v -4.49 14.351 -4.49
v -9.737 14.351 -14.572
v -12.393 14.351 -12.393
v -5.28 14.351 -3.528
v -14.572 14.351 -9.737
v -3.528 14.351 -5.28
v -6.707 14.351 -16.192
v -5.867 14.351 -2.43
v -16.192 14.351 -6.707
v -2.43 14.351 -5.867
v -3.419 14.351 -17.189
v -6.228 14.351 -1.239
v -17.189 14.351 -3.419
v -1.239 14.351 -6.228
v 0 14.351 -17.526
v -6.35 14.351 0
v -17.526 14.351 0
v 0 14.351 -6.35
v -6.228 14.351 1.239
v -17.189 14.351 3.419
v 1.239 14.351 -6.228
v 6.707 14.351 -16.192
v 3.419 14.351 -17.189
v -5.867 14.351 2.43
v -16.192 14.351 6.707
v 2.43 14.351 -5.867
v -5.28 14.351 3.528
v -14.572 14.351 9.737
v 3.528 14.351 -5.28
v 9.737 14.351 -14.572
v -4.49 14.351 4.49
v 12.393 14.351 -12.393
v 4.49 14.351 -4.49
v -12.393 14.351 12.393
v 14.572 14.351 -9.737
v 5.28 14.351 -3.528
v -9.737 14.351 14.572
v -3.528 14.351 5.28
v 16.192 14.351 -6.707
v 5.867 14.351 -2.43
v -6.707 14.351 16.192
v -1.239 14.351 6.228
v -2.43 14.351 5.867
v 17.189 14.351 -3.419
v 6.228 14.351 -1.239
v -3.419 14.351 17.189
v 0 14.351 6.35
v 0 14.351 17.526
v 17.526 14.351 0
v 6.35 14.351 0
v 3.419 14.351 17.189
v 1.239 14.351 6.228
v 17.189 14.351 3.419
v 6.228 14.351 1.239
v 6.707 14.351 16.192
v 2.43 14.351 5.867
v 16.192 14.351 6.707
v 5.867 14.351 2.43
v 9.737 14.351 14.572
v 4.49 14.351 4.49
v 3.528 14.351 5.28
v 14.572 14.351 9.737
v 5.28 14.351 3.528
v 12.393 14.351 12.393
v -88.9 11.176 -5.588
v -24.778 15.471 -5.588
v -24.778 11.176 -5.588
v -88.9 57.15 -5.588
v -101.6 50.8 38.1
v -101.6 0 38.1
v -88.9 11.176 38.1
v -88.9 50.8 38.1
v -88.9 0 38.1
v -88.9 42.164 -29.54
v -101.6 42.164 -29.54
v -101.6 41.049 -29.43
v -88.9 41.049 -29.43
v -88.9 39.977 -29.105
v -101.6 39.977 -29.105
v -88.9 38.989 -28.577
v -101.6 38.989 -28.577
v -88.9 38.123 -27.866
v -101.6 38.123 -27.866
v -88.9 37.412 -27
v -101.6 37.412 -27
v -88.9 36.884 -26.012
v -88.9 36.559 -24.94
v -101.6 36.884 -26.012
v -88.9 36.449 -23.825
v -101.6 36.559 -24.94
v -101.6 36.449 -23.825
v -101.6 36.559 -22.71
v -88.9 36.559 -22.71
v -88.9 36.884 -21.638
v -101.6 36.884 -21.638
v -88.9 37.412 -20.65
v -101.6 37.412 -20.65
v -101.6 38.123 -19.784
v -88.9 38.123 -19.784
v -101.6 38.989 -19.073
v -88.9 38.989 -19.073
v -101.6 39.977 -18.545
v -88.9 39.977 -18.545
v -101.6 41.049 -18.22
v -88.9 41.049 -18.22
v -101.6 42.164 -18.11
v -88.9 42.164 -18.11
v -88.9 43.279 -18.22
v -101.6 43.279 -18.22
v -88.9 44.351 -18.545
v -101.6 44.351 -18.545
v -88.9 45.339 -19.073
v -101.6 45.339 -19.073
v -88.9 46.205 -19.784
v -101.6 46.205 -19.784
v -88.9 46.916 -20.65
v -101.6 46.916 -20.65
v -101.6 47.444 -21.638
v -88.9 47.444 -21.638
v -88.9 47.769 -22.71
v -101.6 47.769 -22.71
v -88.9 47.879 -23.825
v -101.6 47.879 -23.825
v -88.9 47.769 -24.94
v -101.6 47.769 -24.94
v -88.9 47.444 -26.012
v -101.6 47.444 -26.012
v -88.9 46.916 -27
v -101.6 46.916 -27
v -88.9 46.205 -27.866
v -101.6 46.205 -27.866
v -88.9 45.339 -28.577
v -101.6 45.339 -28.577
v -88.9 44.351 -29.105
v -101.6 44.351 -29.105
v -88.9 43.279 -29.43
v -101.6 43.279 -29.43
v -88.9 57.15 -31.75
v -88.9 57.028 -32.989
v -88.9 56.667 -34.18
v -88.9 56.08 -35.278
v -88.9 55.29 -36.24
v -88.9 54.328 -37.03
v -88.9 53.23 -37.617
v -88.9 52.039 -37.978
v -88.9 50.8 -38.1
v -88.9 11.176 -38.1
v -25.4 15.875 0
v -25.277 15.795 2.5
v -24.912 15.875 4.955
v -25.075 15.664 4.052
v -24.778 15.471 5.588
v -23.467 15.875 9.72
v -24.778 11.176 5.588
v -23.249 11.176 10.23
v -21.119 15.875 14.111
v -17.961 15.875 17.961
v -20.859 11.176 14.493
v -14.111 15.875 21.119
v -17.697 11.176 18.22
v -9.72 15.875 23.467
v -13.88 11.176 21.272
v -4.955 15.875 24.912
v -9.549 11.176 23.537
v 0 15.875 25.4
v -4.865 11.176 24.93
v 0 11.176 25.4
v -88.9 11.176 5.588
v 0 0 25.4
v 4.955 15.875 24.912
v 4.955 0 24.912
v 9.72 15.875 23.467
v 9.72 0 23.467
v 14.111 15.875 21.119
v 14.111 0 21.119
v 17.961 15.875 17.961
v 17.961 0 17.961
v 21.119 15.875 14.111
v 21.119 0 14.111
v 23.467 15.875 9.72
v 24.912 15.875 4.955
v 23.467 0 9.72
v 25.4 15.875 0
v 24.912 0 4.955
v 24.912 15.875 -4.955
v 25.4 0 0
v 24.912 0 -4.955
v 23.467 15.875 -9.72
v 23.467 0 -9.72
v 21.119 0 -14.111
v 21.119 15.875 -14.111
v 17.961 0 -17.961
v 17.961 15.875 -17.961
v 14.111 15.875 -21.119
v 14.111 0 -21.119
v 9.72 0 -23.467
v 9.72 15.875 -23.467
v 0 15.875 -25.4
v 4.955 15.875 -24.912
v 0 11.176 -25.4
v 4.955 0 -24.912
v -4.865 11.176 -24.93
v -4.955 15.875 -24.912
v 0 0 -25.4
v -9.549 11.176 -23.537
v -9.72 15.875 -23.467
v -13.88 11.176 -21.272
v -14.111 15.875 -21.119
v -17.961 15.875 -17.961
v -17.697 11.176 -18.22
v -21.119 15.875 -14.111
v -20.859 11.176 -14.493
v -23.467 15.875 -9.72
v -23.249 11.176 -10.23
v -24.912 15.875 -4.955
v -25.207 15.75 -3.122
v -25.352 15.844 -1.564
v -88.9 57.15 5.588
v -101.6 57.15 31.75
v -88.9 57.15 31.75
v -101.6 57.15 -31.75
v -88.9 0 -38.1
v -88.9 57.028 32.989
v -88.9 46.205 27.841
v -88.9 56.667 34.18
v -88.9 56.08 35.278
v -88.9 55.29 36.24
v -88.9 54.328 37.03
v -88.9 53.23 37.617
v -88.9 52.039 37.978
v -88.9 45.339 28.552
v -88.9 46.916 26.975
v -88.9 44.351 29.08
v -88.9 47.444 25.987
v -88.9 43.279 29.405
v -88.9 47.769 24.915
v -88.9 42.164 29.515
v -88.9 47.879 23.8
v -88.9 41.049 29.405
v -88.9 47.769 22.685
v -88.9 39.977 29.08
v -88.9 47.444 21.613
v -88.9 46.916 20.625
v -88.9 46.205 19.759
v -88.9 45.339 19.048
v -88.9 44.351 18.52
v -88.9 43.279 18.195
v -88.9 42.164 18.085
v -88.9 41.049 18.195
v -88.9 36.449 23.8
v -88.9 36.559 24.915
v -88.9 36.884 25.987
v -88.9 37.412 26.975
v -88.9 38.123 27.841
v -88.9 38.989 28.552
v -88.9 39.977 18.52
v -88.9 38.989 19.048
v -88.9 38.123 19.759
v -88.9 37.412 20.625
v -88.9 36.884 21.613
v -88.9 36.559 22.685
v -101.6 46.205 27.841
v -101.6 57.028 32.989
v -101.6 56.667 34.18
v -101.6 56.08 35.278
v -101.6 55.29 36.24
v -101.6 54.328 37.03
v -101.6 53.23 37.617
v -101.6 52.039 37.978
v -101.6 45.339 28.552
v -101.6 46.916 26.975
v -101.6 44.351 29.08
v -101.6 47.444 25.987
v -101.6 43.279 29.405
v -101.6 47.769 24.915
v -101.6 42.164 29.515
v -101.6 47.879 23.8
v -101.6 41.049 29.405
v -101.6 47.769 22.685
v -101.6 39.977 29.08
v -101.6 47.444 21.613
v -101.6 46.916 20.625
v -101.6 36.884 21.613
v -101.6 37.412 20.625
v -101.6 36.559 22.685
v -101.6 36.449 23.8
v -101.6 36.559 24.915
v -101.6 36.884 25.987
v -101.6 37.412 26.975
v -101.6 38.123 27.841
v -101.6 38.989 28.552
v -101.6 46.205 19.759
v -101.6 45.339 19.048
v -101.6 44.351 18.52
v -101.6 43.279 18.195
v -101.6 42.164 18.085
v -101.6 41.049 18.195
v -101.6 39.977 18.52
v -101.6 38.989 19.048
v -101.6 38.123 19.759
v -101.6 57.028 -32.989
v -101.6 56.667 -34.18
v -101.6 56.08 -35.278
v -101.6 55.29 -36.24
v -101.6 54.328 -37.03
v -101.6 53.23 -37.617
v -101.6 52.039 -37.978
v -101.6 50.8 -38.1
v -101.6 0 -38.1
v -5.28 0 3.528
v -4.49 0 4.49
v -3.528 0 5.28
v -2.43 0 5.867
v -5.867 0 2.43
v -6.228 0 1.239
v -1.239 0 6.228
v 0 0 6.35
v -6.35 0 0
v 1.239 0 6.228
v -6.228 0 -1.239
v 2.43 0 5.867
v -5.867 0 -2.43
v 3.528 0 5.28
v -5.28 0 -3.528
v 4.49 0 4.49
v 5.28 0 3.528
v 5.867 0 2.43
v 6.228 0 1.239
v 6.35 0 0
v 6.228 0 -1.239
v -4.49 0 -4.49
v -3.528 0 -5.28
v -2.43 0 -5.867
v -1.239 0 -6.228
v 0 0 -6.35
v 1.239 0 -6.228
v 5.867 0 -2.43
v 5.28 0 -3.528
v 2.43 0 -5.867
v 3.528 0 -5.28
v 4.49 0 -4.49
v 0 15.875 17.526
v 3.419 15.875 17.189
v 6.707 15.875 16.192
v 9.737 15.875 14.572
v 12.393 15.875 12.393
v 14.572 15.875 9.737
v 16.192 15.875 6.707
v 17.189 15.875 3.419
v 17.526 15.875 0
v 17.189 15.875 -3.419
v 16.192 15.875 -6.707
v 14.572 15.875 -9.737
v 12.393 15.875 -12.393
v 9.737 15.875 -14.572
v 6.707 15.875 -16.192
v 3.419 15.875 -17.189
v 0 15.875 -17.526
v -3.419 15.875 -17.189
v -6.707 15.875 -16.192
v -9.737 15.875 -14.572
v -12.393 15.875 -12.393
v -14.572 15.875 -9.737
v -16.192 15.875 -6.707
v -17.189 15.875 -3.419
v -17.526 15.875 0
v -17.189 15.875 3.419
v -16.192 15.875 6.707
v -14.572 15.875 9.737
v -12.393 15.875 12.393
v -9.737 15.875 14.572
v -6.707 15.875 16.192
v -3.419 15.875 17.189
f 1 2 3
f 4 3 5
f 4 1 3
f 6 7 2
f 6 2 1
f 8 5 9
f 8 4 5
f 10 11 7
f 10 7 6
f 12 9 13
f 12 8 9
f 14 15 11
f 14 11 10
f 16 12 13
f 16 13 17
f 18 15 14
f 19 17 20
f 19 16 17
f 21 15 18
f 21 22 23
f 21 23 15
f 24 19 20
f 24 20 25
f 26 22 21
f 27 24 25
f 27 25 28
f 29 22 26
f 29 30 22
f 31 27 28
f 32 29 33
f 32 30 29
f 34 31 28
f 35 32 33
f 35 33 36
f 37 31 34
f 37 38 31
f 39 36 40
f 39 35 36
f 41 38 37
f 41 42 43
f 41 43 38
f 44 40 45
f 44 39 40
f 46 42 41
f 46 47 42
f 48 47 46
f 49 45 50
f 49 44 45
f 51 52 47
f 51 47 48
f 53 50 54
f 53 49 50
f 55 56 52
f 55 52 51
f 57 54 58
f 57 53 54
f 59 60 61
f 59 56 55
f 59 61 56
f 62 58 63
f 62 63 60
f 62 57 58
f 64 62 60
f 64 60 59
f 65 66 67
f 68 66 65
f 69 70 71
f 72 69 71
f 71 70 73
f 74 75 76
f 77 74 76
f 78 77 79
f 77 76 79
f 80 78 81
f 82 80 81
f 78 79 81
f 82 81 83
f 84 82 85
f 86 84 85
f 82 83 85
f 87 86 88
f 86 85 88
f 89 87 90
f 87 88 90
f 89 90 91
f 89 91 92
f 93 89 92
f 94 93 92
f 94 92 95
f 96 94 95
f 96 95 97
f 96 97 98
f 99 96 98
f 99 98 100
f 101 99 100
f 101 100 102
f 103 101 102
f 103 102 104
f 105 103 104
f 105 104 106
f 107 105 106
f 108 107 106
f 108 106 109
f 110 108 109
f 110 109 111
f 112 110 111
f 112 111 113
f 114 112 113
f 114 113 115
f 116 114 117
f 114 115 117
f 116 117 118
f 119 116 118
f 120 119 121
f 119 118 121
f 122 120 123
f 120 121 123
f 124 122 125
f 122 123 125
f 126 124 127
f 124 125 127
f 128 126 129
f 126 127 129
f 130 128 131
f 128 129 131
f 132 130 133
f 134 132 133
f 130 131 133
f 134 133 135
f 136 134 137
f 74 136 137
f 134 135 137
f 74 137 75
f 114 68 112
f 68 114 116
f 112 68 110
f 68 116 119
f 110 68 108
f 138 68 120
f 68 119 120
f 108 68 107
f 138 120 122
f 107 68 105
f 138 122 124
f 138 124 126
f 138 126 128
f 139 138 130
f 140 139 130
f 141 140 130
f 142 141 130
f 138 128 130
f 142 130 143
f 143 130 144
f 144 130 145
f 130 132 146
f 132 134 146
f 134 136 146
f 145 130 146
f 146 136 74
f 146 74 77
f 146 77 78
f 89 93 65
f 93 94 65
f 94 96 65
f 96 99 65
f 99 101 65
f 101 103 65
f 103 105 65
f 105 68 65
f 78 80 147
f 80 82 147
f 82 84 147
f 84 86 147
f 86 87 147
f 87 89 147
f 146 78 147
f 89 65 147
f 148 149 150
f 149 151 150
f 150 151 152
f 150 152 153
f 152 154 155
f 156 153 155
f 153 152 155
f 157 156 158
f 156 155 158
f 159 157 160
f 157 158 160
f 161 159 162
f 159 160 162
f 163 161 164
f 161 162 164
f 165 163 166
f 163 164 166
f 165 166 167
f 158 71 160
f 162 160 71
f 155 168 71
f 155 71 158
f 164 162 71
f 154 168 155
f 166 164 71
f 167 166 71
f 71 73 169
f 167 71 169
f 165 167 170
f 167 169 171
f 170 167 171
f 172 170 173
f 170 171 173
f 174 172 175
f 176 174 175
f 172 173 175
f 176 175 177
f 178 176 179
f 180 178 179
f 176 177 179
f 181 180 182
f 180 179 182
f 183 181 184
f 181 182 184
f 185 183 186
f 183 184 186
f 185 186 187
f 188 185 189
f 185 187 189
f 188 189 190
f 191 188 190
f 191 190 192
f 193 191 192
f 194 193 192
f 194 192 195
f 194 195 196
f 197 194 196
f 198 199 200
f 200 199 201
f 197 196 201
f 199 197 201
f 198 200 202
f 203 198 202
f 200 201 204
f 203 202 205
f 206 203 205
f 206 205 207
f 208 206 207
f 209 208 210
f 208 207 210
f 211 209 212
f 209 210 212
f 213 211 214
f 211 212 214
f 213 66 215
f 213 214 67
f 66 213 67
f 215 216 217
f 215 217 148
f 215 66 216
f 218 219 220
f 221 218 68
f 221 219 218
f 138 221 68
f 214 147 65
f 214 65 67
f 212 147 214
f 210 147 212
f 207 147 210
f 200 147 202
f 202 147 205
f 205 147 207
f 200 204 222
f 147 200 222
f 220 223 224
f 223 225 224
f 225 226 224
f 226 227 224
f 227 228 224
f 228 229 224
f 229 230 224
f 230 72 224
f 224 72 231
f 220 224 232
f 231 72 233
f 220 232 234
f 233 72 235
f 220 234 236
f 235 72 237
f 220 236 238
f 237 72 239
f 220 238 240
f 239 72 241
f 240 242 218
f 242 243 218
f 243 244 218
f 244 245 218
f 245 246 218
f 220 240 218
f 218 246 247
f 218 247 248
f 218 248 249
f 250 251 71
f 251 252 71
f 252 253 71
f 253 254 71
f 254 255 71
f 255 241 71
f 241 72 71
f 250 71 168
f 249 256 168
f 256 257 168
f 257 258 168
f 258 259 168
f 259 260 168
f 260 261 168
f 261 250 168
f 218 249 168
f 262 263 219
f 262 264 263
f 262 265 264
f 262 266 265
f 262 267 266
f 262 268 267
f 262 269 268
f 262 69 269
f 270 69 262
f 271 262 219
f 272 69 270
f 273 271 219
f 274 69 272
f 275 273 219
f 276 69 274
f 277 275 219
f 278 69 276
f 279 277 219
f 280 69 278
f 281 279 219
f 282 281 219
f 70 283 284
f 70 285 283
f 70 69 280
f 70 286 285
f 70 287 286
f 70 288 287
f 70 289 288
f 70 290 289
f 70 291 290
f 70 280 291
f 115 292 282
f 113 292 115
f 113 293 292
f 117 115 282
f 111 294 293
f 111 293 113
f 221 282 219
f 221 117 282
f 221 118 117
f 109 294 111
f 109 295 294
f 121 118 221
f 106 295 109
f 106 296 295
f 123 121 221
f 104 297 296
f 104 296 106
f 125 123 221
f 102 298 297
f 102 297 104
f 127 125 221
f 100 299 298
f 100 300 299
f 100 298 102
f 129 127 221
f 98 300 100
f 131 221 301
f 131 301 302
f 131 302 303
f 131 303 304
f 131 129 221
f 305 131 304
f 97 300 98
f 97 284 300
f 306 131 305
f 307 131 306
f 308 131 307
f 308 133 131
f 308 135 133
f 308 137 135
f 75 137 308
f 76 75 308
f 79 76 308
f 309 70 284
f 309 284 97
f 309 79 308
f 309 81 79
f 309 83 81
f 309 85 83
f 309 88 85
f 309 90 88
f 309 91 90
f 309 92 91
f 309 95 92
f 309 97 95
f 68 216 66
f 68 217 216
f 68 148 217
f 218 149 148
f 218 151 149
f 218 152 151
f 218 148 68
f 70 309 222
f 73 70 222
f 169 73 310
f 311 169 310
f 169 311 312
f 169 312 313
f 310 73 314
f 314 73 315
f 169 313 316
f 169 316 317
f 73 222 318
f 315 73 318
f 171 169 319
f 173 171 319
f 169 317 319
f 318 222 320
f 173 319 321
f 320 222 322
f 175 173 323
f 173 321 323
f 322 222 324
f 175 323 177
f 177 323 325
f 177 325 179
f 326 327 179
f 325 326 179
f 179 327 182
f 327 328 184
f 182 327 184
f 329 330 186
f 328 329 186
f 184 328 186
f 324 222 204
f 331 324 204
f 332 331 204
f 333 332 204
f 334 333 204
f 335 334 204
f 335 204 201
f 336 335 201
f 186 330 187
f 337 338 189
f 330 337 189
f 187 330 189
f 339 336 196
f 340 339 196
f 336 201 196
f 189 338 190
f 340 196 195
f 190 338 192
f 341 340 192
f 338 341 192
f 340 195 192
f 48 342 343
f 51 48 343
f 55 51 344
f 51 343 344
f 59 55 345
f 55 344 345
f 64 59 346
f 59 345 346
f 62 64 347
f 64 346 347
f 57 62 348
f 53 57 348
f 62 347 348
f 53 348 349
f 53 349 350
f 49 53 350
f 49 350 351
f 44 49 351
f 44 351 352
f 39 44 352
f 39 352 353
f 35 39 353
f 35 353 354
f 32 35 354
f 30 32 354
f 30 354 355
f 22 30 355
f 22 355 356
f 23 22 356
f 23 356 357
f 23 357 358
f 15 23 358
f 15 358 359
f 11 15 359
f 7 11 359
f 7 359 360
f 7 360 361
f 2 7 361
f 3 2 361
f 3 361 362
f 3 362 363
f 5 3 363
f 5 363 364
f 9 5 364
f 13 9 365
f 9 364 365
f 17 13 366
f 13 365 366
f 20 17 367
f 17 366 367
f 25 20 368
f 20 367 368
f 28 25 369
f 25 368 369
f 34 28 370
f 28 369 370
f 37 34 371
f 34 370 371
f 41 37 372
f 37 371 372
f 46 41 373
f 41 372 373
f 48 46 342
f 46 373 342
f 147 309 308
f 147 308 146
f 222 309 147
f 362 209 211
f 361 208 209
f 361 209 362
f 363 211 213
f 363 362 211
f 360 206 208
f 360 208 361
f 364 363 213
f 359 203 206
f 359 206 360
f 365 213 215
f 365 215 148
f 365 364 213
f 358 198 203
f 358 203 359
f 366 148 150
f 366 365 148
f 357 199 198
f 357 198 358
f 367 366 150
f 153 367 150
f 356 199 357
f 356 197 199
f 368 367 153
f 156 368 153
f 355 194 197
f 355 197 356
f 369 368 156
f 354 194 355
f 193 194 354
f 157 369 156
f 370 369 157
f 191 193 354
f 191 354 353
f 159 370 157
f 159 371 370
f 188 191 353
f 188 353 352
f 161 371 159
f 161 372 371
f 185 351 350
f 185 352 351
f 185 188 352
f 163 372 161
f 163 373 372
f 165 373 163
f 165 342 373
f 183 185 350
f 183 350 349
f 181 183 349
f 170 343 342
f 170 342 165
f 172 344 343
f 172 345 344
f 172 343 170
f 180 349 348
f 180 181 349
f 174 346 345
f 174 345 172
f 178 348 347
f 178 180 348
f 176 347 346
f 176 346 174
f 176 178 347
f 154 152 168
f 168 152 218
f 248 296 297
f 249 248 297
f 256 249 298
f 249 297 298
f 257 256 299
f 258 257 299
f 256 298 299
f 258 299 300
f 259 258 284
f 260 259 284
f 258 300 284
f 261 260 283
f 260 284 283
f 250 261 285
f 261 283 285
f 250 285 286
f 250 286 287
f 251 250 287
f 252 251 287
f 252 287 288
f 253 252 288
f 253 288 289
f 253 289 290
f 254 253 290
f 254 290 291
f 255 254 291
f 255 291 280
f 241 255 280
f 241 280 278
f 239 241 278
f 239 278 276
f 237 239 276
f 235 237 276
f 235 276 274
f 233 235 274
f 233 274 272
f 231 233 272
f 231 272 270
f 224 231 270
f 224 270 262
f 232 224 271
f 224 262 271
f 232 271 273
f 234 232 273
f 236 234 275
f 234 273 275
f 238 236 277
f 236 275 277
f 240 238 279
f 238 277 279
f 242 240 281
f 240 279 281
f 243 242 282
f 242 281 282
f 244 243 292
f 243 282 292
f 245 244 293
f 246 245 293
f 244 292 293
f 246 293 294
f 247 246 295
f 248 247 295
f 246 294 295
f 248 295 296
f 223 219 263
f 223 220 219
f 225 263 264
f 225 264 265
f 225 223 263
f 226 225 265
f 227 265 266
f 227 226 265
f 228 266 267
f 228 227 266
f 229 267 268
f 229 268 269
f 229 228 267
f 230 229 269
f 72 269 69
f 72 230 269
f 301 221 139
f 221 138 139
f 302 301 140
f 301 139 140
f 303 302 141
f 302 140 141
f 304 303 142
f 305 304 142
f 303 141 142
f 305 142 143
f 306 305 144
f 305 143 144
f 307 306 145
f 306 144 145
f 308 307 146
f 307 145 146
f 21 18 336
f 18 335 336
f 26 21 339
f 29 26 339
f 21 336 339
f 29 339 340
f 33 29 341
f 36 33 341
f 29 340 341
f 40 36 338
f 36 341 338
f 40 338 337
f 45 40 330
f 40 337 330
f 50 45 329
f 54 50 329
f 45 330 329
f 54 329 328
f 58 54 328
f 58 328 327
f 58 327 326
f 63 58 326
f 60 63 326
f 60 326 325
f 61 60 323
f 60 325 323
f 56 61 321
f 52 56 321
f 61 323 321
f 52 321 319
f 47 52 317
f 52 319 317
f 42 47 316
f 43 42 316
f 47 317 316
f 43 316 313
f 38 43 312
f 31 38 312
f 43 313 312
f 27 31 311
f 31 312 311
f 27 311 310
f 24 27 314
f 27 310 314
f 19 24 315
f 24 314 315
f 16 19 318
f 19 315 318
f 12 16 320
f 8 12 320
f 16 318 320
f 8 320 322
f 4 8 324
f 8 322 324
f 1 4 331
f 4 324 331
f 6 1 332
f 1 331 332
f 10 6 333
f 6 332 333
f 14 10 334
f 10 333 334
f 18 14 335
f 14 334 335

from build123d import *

# Parameters (mm, degrees)
SKETCH1_R                                            = 25.4
BOSS_EXTRUDE1_DEPTH                                  = 15.875
BOSS_EXTRUDE2_DEPTH                                  = 11.176
SKETCH3_W                                            = 12.7
SKETCH3_H                                            = 76.2
BOSS_EXTRUDE3_DEPTH                                  = 57.15
CBORE_FOR_3_8_BINDING_HEAD_MACHINE_SCREW_D           = 12.7
CBORE_FOR_3_8_BINDING_HEAD_MACHINE_SCREW_CBORE_D     = 35.052
CBORE_FOR_3_8_BINDING_HEAD_MACHINE_SCREW_CBORE_DEPTH = 1.524
BOSS_EXTRUDE7_DEPTH                                  = 5.588
F_25_64_0_45_DIAMETER_HOLE1_D                        = 11.43
FILLET1_R                                            = 6.35


with BuildPart() as part:
    # Sketch1 → Boss-Extrude1 (new body)
    with BuildSketch(Plane(origin=(0, 0, 0), x_dir=(1, 0, 0), z_dir=(0, 1, 0))):
        with Locations(Location((0, 0, 0), (0, 0, 270))):
            Circle(SKETCH1_R)
    extrude(amount=BOSS_EXTRUDE1_DEPTH)

    # Sketch2 → Boss-Extrude2 (add)
    with BuildSketch(Plane(origin=(0, 0, 0), x_dir=(1, 0, 0), z_dir=(0, 1, 0))):
        with BuildLine():
            Line((-88.9, 38.1), (-88.9, -38.1))
            Line((-88.9, -38.1), (0, -25.4))
            ThreePointArc((0, -25.4), (-25.4, 0), (0, 25.4))
            Line((0, 25.4), (-88.9, 38.1))
        make_face()
    extrude(amount=BOSS_EXTRUDE2_DEPTH)

    # Sketch3 → Boss-Extrude3 (add)
    with BuildSketch(Plane(origin=(0, 0, 0), x_dir=(1, 0, 0), z_dir=(0, 1, 0))):
        with Locations((-95.25, 0)):
            Rectangle(SKETCH3_W, SKETCH3_H)
    extrude(amount=BOSS_EXTRUDE3_DEPTH)

    # CBORE for 3/8 Binding Head Machine Screw1 (through all)
    with Locations(Plane.ZX.offset(15.875)):
        with Locations((0, 0)):
            CounterBoreHole(CBORE_FOR_3_8_BINDING_HEAD_MACHINE_SCREW_D / 2, CBORE_FOR_3_8_BINDING_HEAD_MACHINE_SCREW_CBORE_D / 2, CBORE_FOR_3_8_BINDING_HEAD_MACHINE_SCREW_CBORE_DEPTH)

    # Sketch10 → Boss-Extrude7 (add, symmetric)
    with BuildSketch(Plane.XY):
        Polygon((-88.9, 57.15), (-25.4, 15.875), (-22.86, 14.224), (-22.86, 11.176), (-88.9, 11.176), align=None)
    extrude(amount=BOSS_EXTRUDE7_DEPTH, both=True)

    # 25/64 (0.45) Diameter Hole1 (through all)
    with Locations(Plane(origin=(-88.9, 42.164, 23.7998), x_dir=(0, 0, 1), z_dir=(1, 0, 0))):
        with Locations((0, 0), (-47.625, 0)):
            Hole(F_25_64_0_45_DIAMETER_HOLE1_D / 2)

    # Fillet1
    fillet1_edges = [part.edges().sort_by_distance(p)[0] for p in [
        (-95.25, 57.15, -38.1),
        (-95.25, 57.15, 38.1),
    ]]
    fillet(fillet1_edges, radius=FILLET1_R)


solid = part.part
